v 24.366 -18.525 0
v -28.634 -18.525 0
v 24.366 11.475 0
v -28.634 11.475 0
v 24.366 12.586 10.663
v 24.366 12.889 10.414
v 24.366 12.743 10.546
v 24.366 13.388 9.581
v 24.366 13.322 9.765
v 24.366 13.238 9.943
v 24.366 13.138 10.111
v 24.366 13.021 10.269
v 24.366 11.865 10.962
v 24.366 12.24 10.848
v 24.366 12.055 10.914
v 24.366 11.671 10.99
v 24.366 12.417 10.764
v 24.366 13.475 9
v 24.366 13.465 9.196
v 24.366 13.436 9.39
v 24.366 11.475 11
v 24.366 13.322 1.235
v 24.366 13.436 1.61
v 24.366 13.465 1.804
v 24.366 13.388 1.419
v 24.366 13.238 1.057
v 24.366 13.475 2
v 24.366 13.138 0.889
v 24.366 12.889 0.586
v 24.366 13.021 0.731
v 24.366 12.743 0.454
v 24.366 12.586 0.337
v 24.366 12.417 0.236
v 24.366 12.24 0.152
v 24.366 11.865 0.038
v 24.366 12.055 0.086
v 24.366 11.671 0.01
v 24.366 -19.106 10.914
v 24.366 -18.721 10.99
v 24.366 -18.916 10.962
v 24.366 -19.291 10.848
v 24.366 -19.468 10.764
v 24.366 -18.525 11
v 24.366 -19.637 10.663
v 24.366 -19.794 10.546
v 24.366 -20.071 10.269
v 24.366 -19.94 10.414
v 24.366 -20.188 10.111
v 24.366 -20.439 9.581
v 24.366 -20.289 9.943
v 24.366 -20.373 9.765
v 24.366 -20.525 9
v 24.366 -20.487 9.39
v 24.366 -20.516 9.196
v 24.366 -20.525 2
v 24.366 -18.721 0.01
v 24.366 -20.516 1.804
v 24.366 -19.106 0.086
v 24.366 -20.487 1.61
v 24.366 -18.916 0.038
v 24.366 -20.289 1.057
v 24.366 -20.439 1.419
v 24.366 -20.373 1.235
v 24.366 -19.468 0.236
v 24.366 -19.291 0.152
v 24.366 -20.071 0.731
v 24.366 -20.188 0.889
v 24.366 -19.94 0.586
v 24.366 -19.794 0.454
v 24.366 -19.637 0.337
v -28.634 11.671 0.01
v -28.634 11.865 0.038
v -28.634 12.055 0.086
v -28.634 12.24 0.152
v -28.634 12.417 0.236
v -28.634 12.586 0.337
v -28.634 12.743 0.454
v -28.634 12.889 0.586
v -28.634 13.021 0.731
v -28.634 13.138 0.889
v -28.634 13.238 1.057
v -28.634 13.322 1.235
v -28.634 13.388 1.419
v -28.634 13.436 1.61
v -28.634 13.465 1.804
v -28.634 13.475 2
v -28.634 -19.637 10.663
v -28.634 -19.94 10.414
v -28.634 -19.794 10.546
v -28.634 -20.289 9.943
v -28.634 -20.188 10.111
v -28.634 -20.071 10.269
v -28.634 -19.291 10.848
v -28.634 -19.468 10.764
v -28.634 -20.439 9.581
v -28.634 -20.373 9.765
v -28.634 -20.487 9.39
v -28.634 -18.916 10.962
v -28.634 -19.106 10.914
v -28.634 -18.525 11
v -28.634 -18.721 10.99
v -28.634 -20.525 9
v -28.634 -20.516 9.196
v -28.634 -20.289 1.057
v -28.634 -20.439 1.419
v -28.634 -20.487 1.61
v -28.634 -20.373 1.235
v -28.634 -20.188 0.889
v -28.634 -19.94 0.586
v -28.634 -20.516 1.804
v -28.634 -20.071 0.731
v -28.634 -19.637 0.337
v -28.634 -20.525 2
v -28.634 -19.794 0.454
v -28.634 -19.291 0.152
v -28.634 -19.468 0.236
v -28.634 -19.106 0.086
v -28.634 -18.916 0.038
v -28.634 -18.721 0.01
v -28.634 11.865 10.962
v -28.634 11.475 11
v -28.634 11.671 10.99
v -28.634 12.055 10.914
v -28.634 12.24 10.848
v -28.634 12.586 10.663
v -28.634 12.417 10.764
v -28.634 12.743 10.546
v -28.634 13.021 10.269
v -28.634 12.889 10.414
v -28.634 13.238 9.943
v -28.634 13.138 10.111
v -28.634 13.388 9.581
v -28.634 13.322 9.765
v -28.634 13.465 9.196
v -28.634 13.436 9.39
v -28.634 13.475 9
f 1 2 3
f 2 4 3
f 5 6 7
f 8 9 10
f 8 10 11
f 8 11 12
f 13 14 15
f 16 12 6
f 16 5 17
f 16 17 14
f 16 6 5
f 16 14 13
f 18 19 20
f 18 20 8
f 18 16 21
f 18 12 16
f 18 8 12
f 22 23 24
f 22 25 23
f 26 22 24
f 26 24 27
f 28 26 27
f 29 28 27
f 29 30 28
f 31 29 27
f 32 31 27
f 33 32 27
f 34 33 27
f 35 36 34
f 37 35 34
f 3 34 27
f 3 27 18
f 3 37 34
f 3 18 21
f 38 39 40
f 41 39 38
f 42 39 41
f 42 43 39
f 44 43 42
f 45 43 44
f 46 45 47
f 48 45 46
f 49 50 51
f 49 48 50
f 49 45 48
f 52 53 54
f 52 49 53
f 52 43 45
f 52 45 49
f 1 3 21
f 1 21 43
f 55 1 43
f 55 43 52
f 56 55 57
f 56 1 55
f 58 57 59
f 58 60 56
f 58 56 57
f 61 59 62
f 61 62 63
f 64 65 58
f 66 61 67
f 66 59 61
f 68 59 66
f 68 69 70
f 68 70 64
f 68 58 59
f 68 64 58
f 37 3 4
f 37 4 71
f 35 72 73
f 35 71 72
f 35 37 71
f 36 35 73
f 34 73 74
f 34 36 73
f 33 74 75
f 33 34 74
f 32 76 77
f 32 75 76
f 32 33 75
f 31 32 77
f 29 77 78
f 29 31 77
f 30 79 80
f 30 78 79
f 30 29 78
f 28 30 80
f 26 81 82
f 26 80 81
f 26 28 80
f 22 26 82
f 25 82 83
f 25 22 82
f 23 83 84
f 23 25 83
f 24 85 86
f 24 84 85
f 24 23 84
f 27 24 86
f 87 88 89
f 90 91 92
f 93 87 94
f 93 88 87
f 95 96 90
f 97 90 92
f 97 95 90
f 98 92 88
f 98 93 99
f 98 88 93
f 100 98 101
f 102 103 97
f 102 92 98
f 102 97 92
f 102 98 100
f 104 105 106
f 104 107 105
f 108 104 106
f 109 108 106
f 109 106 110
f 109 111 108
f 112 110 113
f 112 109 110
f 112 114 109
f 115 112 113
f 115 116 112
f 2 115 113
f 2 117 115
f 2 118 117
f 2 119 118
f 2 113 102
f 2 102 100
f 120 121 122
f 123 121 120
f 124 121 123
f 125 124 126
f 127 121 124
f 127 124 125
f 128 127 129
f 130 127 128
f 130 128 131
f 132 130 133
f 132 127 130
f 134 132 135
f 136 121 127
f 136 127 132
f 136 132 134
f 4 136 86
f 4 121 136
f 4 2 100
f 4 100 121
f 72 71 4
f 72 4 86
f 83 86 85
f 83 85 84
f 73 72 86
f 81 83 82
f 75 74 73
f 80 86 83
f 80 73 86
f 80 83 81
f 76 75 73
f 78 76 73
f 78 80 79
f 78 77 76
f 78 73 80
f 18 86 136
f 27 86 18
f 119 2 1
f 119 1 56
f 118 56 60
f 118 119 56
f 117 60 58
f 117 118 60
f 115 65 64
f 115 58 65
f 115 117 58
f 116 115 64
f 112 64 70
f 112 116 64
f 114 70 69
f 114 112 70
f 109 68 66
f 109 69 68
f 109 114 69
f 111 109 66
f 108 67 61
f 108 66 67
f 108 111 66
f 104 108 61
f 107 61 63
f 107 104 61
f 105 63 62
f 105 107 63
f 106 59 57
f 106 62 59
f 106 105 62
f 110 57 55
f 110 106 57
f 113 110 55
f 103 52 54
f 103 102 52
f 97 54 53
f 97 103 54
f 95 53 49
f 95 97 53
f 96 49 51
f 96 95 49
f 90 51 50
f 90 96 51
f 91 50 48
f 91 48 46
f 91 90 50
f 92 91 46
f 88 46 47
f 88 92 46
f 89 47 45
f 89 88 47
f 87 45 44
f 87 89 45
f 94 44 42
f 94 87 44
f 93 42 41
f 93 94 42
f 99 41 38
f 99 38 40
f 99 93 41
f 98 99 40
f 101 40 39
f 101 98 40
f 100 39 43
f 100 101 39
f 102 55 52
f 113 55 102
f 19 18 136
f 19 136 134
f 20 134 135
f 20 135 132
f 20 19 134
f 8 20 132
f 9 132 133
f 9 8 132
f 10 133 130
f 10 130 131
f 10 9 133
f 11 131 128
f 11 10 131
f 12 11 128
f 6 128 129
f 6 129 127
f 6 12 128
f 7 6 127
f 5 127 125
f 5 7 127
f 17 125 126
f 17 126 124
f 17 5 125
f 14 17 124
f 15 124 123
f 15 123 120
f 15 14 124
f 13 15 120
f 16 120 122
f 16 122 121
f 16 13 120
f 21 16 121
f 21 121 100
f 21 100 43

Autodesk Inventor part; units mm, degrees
ref_plane "YZ Plane" through (0, 0, 0) normal (1, 0, 0) x (0, 1, 0)
ref_plane "XZ Plane" through (0, 0, 0) normal (0, 1, 0) x (-1, 0, 0)
ref_plane "XY Plane" through (0, 0, 0) normal (0, 0, 1) x (1, 0, 0)
sketch "Sketch1" plane through (0, 0, 0) normal (0, 0, 1) x (1, 0, 0)
  line L0 (-28.6335, 13.4746) -> (24.3665, 13.4746)
  line L1 (24.3665, 13.4746) -> (24.3665, -20.5254)
  line L2 (24.3665, -20.5254) -> (-28.6335, -20.5254)
  line L3 (-28.6335, -20.5254) -> (-28.6335, 13.4746)
  point P0 (0, 0)
  dimension "d0" = 53
  dimension "d1" = 34
extrude "Extrusion1" add sketch "Sketch1" along normal blind 11
fillet "Fillet1" radius 2 4 edges at (-2.1335, 13.4746, 11) (-2.1335, 13.4746, 0) (-2.1335, -20.5254, 11) (-2.1335, -20.5254, 0)
properties part number "battery_mockup"
